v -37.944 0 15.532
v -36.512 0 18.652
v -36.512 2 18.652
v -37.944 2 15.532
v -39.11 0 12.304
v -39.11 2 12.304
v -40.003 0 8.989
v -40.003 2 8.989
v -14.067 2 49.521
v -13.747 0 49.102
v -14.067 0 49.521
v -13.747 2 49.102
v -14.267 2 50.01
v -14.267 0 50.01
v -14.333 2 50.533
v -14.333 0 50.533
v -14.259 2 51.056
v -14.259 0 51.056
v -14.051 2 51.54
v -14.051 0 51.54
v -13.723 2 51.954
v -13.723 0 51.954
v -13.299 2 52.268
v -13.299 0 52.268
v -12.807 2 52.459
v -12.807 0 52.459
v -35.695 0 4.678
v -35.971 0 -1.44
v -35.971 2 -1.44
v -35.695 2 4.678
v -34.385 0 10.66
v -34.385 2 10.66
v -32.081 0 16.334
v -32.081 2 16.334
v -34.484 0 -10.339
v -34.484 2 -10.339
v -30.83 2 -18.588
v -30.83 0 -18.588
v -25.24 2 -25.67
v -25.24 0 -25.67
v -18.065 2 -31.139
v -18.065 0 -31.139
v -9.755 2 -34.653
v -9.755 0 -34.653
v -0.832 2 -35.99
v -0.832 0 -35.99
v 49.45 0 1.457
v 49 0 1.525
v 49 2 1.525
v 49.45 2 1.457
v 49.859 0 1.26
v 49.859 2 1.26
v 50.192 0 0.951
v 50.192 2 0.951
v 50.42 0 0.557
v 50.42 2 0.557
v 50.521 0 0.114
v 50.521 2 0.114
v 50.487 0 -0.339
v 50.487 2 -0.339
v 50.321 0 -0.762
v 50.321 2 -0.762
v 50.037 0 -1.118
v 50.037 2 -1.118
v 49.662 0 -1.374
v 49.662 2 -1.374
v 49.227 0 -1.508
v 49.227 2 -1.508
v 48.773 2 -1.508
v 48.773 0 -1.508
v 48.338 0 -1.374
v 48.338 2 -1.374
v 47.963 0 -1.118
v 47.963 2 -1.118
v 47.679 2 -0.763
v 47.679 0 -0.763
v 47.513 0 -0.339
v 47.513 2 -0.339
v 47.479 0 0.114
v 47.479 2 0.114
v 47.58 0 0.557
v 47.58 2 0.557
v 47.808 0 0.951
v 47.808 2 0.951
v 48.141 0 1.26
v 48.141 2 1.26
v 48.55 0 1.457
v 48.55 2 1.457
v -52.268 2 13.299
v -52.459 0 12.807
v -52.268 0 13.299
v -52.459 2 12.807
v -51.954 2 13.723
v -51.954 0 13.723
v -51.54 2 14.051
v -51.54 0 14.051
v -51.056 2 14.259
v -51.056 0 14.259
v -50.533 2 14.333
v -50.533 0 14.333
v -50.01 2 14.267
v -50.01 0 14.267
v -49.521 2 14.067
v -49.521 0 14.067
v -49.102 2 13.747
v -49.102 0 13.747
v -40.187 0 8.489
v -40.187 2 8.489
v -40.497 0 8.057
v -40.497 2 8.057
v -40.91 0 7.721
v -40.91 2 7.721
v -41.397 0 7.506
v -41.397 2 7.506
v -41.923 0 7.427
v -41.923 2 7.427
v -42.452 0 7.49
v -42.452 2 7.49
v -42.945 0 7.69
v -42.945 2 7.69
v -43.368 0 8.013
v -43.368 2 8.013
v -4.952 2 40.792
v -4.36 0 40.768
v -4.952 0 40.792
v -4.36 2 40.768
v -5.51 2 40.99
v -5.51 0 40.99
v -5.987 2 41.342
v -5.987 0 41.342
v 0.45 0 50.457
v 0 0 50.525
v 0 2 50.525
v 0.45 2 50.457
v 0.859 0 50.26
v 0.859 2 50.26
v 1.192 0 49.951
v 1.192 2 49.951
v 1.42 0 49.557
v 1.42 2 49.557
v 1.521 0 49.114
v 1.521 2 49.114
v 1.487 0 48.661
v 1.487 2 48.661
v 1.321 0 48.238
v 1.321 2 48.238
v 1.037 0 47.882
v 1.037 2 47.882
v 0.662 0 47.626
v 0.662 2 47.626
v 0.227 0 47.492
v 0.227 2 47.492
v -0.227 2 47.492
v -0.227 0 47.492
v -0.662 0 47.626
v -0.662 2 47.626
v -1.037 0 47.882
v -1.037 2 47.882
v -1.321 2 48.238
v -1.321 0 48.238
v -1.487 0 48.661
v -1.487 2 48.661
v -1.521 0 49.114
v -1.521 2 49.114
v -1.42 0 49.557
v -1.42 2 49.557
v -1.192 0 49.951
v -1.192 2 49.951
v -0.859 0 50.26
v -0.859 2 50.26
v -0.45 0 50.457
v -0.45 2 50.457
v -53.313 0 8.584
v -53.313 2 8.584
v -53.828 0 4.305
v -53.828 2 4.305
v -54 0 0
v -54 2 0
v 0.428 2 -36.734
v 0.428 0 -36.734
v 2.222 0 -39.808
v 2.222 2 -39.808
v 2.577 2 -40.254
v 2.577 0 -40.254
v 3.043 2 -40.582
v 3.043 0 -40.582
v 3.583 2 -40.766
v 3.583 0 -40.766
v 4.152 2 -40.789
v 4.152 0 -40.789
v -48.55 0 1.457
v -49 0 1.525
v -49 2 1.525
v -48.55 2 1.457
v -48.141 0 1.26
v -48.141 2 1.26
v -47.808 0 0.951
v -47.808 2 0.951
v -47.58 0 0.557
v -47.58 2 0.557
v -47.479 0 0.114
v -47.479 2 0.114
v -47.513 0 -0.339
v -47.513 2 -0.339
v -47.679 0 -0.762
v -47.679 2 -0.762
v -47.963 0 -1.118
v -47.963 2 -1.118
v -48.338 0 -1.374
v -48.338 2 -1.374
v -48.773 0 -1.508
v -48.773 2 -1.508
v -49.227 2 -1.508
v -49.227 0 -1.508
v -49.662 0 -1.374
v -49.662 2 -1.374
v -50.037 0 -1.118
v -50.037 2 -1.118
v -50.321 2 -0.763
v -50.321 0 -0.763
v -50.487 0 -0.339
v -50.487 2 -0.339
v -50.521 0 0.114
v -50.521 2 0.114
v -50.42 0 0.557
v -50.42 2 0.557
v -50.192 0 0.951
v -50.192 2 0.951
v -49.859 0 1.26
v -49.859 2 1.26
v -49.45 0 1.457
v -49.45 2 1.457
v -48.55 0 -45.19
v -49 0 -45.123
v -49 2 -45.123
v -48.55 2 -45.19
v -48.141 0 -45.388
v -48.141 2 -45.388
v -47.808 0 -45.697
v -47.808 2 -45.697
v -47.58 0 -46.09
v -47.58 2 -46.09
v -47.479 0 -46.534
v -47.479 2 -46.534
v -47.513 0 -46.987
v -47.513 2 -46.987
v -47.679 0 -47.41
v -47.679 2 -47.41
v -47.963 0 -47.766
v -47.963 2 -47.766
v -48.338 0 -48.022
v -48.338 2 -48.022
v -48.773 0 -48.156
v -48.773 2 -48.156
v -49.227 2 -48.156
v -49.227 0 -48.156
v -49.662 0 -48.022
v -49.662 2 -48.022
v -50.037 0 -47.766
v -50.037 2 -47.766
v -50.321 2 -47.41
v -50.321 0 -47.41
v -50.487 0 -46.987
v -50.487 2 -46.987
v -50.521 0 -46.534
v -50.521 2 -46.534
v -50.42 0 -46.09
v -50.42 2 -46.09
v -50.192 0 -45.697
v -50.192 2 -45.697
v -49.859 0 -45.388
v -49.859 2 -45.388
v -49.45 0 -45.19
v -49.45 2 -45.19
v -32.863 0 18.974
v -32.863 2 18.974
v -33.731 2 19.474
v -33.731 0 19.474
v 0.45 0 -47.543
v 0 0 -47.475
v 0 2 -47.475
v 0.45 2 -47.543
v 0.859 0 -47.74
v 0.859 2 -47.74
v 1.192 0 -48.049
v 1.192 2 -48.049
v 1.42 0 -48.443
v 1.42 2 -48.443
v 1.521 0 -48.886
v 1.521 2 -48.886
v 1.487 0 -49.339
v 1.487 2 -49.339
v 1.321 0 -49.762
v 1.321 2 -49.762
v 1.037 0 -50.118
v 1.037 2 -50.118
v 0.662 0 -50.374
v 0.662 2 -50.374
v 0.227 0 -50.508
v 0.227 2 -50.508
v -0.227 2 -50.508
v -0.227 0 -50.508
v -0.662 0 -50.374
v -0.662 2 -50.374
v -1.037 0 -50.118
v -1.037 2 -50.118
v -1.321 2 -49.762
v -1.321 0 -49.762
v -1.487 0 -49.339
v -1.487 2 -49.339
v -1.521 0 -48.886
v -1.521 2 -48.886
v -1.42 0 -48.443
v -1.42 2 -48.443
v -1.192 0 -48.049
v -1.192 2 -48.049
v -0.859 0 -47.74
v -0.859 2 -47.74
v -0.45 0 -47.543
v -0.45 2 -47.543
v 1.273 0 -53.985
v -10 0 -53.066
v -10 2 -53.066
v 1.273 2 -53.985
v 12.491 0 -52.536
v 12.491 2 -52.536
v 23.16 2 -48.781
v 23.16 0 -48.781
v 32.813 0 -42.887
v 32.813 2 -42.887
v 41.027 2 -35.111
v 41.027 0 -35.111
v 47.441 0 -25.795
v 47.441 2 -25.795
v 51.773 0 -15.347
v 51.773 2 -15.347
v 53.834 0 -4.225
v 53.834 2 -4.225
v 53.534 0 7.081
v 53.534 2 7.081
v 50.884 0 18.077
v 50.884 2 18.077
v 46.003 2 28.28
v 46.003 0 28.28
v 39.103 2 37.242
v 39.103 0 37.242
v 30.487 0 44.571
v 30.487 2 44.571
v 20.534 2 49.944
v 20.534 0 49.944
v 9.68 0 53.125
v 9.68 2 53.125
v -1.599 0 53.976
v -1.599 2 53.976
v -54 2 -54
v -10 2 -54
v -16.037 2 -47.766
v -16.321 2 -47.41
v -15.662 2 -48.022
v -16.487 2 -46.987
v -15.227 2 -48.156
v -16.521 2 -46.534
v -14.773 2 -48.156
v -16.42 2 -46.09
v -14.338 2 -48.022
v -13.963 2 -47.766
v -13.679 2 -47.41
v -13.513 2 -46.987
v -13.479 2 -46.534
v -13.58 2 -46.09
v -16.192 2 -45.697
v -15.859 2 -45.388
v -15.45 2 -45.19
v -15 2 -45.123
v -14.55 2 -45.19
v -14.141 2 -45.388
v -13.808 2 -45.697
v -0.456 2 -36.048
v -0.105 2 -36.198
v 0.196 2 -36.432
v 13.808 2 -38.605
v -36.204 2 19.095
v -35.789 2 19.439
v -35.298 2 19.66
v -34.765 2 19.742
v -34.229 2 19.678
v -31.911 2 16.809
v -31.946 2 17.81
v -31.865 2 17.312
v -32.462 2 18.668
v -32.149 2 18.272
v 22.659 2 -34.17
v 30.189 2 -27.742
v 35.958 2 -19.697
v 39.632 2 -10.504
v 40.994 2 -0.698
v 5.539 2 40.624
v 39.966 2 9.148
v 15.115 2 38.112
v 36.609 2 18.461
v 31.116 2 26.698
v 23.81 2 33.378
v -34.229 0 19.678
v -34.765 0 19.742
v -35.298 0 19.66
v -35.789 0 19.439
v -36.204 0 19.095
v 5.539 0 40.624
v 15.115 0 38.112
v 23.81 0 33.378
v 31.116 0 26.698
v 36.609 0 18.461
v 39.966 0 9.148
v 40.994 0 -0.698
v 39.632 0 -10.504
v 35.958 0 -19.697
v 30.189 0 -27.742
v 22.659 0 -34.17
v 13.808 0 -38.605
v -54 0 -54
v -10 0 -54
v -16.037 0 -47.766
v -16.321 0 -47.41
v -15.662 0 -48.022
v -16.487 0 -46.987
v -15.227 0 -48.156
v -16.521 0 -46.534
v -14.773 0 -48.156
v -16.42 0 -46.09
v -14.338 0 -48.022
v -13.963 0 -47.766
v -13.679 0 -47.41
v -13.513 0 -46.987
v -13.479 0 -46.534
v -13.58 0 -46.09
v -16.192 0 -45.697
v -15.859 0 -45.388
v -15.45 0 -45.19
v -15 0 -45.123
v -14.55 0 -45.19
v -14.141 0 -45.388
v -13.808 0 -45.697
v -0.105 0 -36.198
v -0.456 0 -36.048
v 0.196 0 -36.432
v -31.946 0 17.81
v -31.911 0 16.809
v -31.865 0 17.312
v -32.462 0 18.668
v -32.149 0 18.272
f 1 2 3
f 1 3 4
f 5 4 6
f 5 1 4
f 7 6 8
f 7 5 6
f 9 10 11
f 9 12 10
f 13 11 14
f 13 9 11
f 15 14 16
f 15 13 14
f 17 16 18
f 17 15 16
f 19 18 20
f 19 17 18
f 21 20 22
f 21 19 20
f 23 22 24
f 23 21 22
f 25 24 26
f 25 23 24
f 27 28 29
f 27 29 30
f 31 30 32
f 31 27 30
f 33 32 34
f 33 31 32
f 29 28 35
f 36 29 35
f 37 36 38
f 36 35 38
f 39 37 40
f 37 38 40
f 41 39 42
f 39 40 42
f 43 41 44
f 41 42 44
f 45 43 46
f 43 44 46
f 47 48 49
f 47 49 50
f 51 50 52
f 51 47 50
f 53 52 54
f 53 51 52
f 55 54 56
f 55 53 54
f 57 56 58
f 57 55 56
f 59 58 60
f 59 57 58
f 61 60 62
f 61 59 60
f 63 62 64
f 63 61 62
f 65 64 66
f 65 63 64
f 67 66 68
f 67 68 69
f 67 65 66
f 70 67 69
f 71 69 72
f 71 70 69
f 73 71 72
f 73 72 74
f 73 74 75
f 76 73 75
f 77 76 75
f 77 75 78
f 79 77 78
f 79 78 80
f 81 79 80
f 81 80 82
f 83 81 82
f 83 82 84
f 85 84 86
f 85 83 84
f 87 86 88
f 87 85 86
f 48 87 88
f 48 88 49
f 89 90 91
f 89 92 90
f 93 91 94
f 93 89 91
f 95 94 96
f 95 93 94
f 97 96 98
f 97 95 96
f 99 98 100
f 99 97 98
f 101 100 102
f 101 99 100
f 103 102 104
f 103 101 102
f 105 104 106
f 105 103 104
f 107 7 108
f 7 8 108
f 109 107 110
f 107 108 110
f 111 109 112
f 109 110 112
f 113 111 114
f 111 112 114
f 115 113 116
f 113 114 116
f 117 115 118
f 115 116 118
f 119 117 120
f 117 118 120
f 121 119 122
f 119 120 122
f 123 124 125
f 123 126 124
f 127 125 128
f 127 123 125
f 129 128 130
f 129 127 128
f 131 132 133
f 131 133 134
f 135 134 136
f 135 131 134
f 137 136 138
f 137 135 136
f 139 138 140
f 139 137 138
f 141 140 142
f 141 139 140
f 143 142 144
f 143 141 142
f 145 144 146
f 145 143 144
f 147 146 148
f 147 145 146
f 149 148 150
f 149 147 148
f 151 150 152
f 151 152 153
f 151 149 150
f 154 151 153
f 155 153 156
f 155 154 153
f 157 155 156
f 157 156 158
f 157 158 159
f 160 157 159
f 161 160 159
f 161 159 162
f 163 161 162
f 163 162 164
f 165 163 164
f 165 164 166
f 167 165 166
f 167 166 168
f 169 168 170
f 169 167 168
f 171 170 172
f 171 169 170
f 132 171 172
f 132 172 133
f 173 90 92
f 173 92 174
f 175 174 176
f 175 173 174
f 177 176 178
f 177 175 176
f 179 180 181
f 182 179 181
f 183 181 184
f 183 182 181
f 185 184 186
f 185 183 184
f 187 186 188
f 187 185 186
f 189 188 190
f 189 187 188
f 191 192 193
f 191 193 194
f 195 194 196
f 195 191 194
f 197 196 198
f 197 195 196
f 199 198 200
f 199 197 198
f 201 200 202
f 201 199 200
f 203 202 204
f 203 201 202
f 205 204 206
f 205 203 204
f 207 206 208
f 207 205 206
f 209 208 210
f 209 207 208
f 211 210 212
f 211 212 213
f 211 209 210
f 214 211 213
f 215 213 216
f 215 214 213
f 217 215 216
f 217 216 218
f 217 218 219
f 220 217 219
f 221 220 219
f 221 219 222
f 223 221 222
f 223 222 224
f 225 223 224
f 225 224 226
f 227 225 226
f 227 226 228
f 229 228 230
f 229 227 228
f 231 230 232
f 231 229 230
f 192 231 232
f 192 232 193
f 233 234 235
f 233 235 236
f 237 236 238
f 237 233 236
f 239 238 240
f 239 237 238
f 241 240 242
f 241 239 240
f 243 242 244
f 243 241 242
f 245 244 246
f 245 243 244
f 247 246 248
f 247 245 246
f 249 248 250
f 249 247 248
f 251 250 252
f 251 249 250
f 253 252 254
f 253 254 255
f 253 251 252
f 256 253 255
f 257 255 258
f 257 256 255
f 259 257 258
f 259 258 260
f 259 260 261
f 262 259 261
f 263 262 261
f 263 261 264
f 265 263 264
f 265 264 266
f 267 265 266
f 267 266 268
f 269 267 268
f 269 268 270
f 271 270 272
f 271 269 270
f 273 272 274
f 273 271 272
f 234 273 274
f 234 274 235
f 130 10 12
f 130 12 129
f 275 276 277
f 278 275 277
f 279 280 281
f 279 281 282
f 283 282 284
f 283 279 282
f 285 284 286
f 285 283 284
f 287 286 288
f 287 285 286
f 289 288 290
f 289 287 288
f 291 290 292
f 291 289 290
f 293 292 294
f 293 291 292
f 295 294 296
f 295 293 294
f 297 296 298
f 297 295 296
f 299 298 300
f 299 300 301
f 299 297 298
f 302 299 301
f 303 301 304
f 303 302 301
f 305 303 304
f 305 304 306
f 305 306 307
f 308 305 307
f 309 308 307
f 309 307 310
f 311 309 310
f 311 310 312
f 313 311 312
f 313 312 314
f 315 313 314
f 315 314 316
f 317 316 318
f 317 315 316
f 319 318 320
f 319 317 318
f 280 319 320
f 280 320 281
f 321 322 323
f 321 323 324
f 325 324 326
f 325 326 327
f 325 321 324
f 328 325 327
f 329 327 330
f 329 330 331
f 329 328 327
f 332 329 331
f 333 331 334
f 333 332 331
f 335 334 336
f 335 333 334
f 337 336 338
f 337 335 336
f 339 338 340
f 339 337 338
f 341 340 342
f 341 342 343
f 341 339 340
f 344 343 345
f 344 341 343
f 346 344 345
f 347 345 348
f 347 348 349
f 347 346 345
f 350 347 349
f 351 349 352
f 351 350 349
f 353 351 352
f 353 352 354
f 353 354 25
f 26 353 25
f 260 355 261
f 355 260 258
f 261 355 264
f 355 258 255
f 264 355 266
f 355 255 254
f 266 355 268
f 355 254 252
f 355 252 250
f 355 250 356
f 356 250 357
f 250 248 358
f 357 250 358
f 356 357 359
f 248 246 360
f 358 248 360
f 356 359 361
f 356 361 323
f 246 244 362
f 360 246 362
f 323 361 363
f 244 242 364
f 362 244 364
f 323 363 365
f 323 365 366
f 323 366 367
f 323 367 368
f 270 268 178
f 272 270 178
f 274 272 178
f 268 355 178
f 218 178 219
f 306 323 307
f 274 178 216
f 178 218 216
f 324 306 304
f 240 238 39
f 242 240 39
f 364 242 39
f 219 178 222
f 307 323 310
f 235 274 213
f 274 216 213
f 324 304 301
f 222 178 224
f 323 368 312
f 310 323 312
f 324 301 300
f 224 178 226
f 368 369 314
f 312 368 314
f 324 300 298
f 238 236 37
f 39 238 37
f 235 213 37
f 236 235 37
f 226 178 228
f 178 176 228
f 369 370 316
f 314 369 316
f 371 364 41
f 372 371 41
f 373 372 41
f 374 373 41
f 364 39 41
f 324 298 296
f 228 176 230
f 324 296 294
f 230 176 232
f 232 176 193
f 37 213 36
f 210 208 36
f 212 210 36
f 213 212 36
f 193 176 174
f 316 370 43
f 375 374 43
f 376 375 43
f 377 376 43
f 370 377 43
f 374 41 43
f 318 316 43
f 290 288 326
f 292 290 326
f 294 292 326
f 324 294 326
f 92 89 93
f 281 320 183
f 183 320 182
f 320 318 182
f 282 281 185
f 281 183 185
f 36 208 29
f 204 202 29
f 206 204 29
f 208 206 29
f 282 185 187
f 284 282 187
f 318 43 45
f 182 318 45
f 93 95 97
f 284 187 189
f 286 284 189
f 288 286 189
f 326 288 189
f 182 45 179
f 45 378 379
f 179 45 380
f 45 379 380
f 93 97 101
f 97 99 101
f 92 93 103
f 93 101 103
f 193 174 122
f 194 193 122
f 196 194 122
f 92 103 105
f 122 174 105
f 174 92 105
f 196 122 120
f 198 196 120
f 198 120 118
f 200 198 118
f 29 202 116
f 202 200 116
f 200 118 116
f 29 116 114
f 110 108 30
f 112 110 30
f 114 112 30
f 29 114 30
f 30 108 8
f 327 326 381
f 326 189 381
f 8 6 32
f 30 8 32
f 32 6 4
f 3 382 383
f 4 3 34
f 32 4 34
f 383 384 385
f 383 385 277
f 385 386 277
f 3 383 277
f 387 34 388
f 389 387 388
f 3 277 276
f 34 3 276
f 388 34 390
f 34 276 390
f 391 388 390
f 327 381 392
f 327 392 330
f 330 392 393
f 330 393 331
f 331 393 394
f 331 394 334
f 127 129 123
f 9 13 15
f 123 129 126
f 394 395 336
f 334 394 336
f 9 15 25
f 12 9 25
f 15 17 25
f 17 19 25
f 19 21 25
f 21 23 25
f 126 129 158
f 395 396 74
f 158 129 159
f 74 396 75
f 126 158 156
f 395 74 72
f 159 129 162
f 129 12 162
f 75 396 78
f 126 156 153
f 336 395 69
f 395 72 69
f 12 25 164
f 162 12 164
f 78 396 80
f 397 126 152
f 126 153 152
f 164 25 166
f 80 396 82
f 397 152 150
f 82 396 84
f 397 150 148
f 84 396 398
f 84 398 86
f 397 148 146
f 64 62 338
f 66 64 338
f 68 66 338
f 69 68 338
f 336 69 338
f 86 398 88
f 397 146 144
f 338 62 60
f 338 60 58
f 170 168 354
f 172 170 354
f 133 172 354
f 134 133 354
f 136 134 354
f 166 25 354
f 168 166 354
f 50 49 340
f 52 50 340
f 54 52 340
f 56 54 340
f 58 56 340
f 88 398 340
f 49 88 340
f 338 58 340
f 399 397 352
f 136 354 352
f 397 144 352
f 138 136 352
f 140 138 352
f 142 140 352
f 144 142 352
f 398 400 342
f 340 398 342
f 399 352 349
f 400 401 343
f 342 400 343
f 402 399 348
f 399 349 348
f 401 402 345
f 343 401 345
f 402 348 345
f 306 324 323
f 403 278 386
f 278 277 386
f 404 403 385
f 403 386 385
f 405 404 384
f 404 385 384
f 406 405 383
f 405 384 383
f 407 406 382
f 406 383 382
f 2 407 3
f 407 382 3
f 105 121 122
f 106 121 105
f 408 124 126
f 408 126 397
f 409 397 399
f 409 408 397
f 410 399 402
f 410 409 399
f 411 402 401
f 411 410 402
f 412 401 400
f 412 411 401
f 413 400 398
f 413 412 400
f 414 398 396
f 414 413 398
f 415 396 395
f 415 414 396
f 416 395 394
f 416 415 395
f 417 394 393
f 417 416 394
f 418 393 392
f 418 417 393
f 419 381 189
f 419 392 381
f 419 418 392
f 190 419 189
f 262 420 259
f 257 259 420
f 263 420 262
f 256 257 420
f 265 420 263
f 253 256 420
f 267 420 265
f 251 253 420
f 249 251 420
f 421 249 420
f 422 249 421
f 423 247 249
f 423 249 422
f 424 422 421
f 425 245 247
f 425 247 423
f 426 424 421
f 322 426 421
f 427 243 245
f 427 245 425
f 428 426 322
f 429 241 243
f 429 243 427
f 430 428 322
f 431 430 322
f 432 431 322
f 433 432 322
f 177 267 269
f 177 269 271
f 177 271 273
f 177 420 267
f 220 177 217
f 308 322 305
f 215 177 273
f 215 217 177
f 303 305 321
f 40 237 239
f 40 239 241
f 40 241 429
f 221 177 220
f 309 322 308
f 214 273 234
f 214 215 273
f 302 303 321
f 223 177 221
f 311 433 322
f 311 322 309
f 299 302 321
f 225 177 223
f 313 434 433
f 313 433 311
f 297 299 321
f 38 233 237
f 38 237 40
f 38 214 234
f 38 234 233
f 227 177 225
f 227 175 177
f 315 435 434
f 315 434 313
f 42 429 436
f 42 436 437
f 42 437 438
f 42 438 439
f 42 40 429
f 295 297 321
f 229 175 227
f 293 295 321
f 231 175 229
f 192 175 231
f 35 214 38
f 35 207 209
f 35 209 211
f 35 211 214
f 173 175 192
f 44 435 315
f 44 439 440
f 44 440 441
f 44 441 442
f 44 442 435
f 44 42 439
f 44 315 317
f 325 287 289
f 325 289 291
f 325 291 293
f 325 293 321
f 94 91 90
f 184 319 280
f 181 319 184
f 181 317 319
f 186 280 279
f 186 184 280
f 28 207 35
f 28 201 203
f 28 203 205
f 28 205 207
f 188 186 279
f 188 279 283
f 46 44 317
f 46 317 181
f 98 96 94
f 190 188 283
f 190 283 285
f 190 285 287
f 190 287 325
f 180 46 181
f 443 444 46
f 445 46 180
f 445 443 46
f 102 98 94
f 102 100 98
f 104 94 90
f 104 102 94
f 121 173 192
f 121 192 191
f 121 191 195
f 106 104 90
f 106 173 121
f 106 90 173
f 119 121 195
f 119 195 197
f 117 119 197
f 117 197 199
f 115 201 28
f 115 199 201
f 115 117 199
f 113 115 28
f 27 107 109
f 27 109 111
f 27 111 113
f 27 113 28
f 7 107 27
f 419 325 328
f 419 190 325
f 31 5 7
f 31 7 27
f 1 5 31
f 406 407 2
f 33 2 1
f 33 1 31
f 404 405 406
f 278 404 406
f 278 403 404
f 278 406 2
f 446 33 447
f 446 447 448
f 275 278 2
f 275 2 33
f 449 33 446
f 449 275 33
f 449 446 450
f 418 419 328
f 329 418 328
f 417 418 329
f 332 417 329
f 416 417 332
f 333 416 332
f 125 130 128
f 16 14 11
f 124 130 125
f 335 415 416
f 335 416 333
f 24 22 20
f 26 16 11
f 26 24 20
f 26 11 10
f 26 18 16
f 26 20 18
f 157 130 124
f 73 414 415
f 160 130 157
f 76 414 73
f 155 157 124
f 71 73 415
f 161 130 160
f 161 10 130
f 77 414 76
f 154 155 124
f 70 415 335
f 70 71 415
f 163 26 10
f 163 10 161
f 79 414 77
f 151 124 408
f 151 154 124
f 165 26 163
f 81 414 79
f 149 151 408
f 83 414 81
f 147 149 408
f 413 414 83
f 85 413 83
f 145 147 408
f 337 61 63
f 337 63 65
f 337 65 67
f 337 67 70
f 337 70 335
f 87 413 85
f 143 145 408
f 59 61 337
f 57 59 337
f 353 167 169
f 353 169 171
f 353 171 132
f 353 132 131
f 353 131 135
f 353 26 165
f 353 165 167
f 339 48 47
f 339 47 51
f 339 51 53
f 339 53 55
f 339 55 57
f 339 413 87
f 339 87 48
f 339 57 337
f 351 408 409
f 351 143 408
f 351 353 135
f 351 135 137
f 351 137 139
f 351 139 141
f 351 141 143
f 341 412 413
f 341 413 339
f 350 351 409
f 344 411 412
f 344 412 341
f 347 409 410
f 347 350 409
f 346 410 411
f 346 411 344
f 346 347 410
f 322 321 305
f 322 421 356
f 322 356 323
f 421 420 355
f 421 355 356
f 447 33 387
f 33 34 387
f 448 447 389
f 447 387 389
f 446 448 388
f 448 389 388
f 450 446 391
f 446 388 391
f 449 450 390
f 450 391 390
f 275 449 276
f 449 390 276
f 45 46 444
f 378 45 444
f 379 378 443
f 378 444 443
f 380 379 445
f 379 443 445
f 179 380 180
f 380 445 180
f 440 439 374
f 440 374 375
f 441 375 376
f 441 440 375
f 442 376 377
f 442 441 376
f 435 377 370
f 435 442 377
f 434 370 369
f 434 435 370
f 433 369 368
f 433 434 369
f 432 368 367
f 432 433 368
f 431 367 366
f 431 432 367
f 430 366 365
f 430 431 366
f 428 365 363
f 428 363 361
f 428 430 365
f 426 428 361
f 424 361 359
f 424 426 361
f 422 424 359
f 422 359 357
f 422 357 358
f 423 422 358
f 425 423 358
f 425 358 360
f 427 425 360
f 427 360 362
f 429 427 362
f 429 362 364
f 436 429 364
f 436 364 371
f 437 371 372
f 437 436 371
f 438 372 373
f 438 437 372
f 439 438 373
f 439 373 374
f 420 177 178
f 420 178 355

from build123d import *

# Parameters (mm, degrees)
SKETCH_1_R          = 41
SKETCH_1_R_2        = 1.525
EXTRUDE_1_DEPTH     = 2
EXTRUDE_3_DEPTH     = 2
FILLET_1_R          = 2
EXTRUDE_5_DEPTH     = 2
CUT_EXTRUDE_1_DEPTH = 10
FILLET_3_R          = 2


with BuildPart() as part:
    # 草图1 → 凸台-拉伸1 (new body)
    with BuildSketch(Plane(origin=(0, 0, 0), x_dir=(1, 0, 0), z_dir=(0, 1, 0))):
        with BuildLine():
            Line((-54, 0), (-54, 54))
            Line((-54, 54), (-10, 54))
            Line((-10, 54), (-10, 53.065996646))
            ThreePointArc((-10, 53.065996646), (41.569219382, -34.467375879), (-54, 0))
        make_face()
        with Locations(Location((0, 0, 0), (0, 0, 270))):
            Circle(SKETCH_1_R, mode=Mode.SUBTRACT)
        with Locations(Location((-15, 46.647615159, 0), (0, 0, 270))):
            Circle(SKETCH_1_R_2, mode=Mode.SUBTRACT)
        with Locations(Location((0, 49, 0), (0, 0, 270))):
            Circle(SKETCH_1_R_2, mode=Mode.SUBTRACT)
        with Locations(Location((49, 0, 0), (0, 0, 270))):
            Circle(SKETCH_1_R_2, mode=Mode.SUBTRACT)
        with Locations(Location((0, -49, 0), (0, 0, 270))):
            Circle(SKETCH_1_R_2, mode=Mode.SUBTRACT)
        with Locations(Location((-49, 0, 0), (0, 0, 270))):
            Circle(SKETCH_1_R_2, mode=Mode.SUBTRACT)
        with Locations(Location((-49, 46.647615159, 0), (0, 0, 270))):
            Circle(SKETCH_1_R_2, mode=Mode.SUBTRACT)
    extrude(amount=EXTRUDE_1_DEPTH)

    # 草图2 → 凸台-拉伸3 (add)
    with BuildSketch(Plane(origin=(0, 0, 0), x_dir=(1, 0, 0), z_dir=(0, 1, 0))):
        with BuildLine():
            Line((-41, 0), (-37.46998799, 0))
            ThreePointArc((-37.46998799, 0), (-36.430757506, 0.418334617), (-35.971188471, 1.44))
            ThreePointArc((-35.971188471, 1.44), (-25.240038288, 25.669835746), (-0.832477451, 35.990373453))
            ThreePointArc((-0.832477451, 35.990373453), (-0.105240976, 36.197891356), (0.428319211, 36.733848535))
            Line((0.428319211, 36.733848535), (2.860015424, 40.900126061))
            ThreePointArc((2.860015424, 40.900126061), (-27.961932763, 29.985501766), (-41, 0))
        make_face()
    extrude(amount=EXTRUDE_3_DEPTH)

    # 圆角1
    fillet_1_edges = [part.edges().sort_by_distance(p)[0] for p in [
        (2.860015424, 1, -40.900126061),
        (-41, 1, 0),
    ]]
    fillet(fillet_1_edges, radius=FILLET_1_R)

    # 草图4 → 凸台-拉伸5 (add)
    with BuildSketch(Plane.XZ):
        with BuildLine():
            Line((-38.948684188, 0), (-37.46998799, 0))
            ThreePointArc((-37.46998799, 0), (-36.430757506, -0.418334617), (-35.971188471, -1.44))
            ThreePointArc((-35.971188471, -1.44), (-34.952758609, 8.620015408), (-31.176914536, 18))
            Line((-31.176914536, 18), (-35.507041555, 20.5))
            ThreePointArc((-35.507041555, 20.5), (-39.317748075, 11.623884304), (-40.946052608, 2.102564103))
            ThreePointArc((-40.946052608, 2.102564103), (-40.398706292, 0.622525537), (-38.948684188, 0))
        make_face()
    extrude(amount=-EXTRUDE_5_DEPTH)

    # 草图5 → 切除-拉伸1 (cut)
    with BuildSketch(Plane.XZ):
        with BuildLine():
            Line((-16.167566472, 51.522905531), (-5.300581056, 40.655920116))
            ThreePointArc((-5.300581056, 40.655920116), (-28.991378029, 28.991378029), (-40.655920116, 5.300581056))
            Line((-40.655920116, 5.300581056), (-51.522905531, 16.167566472))
            ThreePointArc((-51.522905531, 16.167566472), (-38.183766184, 38.183766184), (-16.167566472, 51.522905531))
        make_face()
    extrude(amount=-CUT_EXTRUDE_1_DEPTH, mode=Mode.SUBTRACT)

    # 圆角3
    fillet_3_edges = [part.edges().sort_by_distance(p)[0] for p in [
        (-5.300581056, 1, 40.655920116),
        (-40.655920116, 1, 5.300581056),
        (-35.507041555, 1, 20.5),
        (-31.176914536, 1, 18),
        (-51.522905531, 1, 16.167566472),
        (-16.167566472, 1, 51.522905531),
    ]]
    fillet(fillet_3_edges, radius=FILLET_3_R)


solid = part.part
